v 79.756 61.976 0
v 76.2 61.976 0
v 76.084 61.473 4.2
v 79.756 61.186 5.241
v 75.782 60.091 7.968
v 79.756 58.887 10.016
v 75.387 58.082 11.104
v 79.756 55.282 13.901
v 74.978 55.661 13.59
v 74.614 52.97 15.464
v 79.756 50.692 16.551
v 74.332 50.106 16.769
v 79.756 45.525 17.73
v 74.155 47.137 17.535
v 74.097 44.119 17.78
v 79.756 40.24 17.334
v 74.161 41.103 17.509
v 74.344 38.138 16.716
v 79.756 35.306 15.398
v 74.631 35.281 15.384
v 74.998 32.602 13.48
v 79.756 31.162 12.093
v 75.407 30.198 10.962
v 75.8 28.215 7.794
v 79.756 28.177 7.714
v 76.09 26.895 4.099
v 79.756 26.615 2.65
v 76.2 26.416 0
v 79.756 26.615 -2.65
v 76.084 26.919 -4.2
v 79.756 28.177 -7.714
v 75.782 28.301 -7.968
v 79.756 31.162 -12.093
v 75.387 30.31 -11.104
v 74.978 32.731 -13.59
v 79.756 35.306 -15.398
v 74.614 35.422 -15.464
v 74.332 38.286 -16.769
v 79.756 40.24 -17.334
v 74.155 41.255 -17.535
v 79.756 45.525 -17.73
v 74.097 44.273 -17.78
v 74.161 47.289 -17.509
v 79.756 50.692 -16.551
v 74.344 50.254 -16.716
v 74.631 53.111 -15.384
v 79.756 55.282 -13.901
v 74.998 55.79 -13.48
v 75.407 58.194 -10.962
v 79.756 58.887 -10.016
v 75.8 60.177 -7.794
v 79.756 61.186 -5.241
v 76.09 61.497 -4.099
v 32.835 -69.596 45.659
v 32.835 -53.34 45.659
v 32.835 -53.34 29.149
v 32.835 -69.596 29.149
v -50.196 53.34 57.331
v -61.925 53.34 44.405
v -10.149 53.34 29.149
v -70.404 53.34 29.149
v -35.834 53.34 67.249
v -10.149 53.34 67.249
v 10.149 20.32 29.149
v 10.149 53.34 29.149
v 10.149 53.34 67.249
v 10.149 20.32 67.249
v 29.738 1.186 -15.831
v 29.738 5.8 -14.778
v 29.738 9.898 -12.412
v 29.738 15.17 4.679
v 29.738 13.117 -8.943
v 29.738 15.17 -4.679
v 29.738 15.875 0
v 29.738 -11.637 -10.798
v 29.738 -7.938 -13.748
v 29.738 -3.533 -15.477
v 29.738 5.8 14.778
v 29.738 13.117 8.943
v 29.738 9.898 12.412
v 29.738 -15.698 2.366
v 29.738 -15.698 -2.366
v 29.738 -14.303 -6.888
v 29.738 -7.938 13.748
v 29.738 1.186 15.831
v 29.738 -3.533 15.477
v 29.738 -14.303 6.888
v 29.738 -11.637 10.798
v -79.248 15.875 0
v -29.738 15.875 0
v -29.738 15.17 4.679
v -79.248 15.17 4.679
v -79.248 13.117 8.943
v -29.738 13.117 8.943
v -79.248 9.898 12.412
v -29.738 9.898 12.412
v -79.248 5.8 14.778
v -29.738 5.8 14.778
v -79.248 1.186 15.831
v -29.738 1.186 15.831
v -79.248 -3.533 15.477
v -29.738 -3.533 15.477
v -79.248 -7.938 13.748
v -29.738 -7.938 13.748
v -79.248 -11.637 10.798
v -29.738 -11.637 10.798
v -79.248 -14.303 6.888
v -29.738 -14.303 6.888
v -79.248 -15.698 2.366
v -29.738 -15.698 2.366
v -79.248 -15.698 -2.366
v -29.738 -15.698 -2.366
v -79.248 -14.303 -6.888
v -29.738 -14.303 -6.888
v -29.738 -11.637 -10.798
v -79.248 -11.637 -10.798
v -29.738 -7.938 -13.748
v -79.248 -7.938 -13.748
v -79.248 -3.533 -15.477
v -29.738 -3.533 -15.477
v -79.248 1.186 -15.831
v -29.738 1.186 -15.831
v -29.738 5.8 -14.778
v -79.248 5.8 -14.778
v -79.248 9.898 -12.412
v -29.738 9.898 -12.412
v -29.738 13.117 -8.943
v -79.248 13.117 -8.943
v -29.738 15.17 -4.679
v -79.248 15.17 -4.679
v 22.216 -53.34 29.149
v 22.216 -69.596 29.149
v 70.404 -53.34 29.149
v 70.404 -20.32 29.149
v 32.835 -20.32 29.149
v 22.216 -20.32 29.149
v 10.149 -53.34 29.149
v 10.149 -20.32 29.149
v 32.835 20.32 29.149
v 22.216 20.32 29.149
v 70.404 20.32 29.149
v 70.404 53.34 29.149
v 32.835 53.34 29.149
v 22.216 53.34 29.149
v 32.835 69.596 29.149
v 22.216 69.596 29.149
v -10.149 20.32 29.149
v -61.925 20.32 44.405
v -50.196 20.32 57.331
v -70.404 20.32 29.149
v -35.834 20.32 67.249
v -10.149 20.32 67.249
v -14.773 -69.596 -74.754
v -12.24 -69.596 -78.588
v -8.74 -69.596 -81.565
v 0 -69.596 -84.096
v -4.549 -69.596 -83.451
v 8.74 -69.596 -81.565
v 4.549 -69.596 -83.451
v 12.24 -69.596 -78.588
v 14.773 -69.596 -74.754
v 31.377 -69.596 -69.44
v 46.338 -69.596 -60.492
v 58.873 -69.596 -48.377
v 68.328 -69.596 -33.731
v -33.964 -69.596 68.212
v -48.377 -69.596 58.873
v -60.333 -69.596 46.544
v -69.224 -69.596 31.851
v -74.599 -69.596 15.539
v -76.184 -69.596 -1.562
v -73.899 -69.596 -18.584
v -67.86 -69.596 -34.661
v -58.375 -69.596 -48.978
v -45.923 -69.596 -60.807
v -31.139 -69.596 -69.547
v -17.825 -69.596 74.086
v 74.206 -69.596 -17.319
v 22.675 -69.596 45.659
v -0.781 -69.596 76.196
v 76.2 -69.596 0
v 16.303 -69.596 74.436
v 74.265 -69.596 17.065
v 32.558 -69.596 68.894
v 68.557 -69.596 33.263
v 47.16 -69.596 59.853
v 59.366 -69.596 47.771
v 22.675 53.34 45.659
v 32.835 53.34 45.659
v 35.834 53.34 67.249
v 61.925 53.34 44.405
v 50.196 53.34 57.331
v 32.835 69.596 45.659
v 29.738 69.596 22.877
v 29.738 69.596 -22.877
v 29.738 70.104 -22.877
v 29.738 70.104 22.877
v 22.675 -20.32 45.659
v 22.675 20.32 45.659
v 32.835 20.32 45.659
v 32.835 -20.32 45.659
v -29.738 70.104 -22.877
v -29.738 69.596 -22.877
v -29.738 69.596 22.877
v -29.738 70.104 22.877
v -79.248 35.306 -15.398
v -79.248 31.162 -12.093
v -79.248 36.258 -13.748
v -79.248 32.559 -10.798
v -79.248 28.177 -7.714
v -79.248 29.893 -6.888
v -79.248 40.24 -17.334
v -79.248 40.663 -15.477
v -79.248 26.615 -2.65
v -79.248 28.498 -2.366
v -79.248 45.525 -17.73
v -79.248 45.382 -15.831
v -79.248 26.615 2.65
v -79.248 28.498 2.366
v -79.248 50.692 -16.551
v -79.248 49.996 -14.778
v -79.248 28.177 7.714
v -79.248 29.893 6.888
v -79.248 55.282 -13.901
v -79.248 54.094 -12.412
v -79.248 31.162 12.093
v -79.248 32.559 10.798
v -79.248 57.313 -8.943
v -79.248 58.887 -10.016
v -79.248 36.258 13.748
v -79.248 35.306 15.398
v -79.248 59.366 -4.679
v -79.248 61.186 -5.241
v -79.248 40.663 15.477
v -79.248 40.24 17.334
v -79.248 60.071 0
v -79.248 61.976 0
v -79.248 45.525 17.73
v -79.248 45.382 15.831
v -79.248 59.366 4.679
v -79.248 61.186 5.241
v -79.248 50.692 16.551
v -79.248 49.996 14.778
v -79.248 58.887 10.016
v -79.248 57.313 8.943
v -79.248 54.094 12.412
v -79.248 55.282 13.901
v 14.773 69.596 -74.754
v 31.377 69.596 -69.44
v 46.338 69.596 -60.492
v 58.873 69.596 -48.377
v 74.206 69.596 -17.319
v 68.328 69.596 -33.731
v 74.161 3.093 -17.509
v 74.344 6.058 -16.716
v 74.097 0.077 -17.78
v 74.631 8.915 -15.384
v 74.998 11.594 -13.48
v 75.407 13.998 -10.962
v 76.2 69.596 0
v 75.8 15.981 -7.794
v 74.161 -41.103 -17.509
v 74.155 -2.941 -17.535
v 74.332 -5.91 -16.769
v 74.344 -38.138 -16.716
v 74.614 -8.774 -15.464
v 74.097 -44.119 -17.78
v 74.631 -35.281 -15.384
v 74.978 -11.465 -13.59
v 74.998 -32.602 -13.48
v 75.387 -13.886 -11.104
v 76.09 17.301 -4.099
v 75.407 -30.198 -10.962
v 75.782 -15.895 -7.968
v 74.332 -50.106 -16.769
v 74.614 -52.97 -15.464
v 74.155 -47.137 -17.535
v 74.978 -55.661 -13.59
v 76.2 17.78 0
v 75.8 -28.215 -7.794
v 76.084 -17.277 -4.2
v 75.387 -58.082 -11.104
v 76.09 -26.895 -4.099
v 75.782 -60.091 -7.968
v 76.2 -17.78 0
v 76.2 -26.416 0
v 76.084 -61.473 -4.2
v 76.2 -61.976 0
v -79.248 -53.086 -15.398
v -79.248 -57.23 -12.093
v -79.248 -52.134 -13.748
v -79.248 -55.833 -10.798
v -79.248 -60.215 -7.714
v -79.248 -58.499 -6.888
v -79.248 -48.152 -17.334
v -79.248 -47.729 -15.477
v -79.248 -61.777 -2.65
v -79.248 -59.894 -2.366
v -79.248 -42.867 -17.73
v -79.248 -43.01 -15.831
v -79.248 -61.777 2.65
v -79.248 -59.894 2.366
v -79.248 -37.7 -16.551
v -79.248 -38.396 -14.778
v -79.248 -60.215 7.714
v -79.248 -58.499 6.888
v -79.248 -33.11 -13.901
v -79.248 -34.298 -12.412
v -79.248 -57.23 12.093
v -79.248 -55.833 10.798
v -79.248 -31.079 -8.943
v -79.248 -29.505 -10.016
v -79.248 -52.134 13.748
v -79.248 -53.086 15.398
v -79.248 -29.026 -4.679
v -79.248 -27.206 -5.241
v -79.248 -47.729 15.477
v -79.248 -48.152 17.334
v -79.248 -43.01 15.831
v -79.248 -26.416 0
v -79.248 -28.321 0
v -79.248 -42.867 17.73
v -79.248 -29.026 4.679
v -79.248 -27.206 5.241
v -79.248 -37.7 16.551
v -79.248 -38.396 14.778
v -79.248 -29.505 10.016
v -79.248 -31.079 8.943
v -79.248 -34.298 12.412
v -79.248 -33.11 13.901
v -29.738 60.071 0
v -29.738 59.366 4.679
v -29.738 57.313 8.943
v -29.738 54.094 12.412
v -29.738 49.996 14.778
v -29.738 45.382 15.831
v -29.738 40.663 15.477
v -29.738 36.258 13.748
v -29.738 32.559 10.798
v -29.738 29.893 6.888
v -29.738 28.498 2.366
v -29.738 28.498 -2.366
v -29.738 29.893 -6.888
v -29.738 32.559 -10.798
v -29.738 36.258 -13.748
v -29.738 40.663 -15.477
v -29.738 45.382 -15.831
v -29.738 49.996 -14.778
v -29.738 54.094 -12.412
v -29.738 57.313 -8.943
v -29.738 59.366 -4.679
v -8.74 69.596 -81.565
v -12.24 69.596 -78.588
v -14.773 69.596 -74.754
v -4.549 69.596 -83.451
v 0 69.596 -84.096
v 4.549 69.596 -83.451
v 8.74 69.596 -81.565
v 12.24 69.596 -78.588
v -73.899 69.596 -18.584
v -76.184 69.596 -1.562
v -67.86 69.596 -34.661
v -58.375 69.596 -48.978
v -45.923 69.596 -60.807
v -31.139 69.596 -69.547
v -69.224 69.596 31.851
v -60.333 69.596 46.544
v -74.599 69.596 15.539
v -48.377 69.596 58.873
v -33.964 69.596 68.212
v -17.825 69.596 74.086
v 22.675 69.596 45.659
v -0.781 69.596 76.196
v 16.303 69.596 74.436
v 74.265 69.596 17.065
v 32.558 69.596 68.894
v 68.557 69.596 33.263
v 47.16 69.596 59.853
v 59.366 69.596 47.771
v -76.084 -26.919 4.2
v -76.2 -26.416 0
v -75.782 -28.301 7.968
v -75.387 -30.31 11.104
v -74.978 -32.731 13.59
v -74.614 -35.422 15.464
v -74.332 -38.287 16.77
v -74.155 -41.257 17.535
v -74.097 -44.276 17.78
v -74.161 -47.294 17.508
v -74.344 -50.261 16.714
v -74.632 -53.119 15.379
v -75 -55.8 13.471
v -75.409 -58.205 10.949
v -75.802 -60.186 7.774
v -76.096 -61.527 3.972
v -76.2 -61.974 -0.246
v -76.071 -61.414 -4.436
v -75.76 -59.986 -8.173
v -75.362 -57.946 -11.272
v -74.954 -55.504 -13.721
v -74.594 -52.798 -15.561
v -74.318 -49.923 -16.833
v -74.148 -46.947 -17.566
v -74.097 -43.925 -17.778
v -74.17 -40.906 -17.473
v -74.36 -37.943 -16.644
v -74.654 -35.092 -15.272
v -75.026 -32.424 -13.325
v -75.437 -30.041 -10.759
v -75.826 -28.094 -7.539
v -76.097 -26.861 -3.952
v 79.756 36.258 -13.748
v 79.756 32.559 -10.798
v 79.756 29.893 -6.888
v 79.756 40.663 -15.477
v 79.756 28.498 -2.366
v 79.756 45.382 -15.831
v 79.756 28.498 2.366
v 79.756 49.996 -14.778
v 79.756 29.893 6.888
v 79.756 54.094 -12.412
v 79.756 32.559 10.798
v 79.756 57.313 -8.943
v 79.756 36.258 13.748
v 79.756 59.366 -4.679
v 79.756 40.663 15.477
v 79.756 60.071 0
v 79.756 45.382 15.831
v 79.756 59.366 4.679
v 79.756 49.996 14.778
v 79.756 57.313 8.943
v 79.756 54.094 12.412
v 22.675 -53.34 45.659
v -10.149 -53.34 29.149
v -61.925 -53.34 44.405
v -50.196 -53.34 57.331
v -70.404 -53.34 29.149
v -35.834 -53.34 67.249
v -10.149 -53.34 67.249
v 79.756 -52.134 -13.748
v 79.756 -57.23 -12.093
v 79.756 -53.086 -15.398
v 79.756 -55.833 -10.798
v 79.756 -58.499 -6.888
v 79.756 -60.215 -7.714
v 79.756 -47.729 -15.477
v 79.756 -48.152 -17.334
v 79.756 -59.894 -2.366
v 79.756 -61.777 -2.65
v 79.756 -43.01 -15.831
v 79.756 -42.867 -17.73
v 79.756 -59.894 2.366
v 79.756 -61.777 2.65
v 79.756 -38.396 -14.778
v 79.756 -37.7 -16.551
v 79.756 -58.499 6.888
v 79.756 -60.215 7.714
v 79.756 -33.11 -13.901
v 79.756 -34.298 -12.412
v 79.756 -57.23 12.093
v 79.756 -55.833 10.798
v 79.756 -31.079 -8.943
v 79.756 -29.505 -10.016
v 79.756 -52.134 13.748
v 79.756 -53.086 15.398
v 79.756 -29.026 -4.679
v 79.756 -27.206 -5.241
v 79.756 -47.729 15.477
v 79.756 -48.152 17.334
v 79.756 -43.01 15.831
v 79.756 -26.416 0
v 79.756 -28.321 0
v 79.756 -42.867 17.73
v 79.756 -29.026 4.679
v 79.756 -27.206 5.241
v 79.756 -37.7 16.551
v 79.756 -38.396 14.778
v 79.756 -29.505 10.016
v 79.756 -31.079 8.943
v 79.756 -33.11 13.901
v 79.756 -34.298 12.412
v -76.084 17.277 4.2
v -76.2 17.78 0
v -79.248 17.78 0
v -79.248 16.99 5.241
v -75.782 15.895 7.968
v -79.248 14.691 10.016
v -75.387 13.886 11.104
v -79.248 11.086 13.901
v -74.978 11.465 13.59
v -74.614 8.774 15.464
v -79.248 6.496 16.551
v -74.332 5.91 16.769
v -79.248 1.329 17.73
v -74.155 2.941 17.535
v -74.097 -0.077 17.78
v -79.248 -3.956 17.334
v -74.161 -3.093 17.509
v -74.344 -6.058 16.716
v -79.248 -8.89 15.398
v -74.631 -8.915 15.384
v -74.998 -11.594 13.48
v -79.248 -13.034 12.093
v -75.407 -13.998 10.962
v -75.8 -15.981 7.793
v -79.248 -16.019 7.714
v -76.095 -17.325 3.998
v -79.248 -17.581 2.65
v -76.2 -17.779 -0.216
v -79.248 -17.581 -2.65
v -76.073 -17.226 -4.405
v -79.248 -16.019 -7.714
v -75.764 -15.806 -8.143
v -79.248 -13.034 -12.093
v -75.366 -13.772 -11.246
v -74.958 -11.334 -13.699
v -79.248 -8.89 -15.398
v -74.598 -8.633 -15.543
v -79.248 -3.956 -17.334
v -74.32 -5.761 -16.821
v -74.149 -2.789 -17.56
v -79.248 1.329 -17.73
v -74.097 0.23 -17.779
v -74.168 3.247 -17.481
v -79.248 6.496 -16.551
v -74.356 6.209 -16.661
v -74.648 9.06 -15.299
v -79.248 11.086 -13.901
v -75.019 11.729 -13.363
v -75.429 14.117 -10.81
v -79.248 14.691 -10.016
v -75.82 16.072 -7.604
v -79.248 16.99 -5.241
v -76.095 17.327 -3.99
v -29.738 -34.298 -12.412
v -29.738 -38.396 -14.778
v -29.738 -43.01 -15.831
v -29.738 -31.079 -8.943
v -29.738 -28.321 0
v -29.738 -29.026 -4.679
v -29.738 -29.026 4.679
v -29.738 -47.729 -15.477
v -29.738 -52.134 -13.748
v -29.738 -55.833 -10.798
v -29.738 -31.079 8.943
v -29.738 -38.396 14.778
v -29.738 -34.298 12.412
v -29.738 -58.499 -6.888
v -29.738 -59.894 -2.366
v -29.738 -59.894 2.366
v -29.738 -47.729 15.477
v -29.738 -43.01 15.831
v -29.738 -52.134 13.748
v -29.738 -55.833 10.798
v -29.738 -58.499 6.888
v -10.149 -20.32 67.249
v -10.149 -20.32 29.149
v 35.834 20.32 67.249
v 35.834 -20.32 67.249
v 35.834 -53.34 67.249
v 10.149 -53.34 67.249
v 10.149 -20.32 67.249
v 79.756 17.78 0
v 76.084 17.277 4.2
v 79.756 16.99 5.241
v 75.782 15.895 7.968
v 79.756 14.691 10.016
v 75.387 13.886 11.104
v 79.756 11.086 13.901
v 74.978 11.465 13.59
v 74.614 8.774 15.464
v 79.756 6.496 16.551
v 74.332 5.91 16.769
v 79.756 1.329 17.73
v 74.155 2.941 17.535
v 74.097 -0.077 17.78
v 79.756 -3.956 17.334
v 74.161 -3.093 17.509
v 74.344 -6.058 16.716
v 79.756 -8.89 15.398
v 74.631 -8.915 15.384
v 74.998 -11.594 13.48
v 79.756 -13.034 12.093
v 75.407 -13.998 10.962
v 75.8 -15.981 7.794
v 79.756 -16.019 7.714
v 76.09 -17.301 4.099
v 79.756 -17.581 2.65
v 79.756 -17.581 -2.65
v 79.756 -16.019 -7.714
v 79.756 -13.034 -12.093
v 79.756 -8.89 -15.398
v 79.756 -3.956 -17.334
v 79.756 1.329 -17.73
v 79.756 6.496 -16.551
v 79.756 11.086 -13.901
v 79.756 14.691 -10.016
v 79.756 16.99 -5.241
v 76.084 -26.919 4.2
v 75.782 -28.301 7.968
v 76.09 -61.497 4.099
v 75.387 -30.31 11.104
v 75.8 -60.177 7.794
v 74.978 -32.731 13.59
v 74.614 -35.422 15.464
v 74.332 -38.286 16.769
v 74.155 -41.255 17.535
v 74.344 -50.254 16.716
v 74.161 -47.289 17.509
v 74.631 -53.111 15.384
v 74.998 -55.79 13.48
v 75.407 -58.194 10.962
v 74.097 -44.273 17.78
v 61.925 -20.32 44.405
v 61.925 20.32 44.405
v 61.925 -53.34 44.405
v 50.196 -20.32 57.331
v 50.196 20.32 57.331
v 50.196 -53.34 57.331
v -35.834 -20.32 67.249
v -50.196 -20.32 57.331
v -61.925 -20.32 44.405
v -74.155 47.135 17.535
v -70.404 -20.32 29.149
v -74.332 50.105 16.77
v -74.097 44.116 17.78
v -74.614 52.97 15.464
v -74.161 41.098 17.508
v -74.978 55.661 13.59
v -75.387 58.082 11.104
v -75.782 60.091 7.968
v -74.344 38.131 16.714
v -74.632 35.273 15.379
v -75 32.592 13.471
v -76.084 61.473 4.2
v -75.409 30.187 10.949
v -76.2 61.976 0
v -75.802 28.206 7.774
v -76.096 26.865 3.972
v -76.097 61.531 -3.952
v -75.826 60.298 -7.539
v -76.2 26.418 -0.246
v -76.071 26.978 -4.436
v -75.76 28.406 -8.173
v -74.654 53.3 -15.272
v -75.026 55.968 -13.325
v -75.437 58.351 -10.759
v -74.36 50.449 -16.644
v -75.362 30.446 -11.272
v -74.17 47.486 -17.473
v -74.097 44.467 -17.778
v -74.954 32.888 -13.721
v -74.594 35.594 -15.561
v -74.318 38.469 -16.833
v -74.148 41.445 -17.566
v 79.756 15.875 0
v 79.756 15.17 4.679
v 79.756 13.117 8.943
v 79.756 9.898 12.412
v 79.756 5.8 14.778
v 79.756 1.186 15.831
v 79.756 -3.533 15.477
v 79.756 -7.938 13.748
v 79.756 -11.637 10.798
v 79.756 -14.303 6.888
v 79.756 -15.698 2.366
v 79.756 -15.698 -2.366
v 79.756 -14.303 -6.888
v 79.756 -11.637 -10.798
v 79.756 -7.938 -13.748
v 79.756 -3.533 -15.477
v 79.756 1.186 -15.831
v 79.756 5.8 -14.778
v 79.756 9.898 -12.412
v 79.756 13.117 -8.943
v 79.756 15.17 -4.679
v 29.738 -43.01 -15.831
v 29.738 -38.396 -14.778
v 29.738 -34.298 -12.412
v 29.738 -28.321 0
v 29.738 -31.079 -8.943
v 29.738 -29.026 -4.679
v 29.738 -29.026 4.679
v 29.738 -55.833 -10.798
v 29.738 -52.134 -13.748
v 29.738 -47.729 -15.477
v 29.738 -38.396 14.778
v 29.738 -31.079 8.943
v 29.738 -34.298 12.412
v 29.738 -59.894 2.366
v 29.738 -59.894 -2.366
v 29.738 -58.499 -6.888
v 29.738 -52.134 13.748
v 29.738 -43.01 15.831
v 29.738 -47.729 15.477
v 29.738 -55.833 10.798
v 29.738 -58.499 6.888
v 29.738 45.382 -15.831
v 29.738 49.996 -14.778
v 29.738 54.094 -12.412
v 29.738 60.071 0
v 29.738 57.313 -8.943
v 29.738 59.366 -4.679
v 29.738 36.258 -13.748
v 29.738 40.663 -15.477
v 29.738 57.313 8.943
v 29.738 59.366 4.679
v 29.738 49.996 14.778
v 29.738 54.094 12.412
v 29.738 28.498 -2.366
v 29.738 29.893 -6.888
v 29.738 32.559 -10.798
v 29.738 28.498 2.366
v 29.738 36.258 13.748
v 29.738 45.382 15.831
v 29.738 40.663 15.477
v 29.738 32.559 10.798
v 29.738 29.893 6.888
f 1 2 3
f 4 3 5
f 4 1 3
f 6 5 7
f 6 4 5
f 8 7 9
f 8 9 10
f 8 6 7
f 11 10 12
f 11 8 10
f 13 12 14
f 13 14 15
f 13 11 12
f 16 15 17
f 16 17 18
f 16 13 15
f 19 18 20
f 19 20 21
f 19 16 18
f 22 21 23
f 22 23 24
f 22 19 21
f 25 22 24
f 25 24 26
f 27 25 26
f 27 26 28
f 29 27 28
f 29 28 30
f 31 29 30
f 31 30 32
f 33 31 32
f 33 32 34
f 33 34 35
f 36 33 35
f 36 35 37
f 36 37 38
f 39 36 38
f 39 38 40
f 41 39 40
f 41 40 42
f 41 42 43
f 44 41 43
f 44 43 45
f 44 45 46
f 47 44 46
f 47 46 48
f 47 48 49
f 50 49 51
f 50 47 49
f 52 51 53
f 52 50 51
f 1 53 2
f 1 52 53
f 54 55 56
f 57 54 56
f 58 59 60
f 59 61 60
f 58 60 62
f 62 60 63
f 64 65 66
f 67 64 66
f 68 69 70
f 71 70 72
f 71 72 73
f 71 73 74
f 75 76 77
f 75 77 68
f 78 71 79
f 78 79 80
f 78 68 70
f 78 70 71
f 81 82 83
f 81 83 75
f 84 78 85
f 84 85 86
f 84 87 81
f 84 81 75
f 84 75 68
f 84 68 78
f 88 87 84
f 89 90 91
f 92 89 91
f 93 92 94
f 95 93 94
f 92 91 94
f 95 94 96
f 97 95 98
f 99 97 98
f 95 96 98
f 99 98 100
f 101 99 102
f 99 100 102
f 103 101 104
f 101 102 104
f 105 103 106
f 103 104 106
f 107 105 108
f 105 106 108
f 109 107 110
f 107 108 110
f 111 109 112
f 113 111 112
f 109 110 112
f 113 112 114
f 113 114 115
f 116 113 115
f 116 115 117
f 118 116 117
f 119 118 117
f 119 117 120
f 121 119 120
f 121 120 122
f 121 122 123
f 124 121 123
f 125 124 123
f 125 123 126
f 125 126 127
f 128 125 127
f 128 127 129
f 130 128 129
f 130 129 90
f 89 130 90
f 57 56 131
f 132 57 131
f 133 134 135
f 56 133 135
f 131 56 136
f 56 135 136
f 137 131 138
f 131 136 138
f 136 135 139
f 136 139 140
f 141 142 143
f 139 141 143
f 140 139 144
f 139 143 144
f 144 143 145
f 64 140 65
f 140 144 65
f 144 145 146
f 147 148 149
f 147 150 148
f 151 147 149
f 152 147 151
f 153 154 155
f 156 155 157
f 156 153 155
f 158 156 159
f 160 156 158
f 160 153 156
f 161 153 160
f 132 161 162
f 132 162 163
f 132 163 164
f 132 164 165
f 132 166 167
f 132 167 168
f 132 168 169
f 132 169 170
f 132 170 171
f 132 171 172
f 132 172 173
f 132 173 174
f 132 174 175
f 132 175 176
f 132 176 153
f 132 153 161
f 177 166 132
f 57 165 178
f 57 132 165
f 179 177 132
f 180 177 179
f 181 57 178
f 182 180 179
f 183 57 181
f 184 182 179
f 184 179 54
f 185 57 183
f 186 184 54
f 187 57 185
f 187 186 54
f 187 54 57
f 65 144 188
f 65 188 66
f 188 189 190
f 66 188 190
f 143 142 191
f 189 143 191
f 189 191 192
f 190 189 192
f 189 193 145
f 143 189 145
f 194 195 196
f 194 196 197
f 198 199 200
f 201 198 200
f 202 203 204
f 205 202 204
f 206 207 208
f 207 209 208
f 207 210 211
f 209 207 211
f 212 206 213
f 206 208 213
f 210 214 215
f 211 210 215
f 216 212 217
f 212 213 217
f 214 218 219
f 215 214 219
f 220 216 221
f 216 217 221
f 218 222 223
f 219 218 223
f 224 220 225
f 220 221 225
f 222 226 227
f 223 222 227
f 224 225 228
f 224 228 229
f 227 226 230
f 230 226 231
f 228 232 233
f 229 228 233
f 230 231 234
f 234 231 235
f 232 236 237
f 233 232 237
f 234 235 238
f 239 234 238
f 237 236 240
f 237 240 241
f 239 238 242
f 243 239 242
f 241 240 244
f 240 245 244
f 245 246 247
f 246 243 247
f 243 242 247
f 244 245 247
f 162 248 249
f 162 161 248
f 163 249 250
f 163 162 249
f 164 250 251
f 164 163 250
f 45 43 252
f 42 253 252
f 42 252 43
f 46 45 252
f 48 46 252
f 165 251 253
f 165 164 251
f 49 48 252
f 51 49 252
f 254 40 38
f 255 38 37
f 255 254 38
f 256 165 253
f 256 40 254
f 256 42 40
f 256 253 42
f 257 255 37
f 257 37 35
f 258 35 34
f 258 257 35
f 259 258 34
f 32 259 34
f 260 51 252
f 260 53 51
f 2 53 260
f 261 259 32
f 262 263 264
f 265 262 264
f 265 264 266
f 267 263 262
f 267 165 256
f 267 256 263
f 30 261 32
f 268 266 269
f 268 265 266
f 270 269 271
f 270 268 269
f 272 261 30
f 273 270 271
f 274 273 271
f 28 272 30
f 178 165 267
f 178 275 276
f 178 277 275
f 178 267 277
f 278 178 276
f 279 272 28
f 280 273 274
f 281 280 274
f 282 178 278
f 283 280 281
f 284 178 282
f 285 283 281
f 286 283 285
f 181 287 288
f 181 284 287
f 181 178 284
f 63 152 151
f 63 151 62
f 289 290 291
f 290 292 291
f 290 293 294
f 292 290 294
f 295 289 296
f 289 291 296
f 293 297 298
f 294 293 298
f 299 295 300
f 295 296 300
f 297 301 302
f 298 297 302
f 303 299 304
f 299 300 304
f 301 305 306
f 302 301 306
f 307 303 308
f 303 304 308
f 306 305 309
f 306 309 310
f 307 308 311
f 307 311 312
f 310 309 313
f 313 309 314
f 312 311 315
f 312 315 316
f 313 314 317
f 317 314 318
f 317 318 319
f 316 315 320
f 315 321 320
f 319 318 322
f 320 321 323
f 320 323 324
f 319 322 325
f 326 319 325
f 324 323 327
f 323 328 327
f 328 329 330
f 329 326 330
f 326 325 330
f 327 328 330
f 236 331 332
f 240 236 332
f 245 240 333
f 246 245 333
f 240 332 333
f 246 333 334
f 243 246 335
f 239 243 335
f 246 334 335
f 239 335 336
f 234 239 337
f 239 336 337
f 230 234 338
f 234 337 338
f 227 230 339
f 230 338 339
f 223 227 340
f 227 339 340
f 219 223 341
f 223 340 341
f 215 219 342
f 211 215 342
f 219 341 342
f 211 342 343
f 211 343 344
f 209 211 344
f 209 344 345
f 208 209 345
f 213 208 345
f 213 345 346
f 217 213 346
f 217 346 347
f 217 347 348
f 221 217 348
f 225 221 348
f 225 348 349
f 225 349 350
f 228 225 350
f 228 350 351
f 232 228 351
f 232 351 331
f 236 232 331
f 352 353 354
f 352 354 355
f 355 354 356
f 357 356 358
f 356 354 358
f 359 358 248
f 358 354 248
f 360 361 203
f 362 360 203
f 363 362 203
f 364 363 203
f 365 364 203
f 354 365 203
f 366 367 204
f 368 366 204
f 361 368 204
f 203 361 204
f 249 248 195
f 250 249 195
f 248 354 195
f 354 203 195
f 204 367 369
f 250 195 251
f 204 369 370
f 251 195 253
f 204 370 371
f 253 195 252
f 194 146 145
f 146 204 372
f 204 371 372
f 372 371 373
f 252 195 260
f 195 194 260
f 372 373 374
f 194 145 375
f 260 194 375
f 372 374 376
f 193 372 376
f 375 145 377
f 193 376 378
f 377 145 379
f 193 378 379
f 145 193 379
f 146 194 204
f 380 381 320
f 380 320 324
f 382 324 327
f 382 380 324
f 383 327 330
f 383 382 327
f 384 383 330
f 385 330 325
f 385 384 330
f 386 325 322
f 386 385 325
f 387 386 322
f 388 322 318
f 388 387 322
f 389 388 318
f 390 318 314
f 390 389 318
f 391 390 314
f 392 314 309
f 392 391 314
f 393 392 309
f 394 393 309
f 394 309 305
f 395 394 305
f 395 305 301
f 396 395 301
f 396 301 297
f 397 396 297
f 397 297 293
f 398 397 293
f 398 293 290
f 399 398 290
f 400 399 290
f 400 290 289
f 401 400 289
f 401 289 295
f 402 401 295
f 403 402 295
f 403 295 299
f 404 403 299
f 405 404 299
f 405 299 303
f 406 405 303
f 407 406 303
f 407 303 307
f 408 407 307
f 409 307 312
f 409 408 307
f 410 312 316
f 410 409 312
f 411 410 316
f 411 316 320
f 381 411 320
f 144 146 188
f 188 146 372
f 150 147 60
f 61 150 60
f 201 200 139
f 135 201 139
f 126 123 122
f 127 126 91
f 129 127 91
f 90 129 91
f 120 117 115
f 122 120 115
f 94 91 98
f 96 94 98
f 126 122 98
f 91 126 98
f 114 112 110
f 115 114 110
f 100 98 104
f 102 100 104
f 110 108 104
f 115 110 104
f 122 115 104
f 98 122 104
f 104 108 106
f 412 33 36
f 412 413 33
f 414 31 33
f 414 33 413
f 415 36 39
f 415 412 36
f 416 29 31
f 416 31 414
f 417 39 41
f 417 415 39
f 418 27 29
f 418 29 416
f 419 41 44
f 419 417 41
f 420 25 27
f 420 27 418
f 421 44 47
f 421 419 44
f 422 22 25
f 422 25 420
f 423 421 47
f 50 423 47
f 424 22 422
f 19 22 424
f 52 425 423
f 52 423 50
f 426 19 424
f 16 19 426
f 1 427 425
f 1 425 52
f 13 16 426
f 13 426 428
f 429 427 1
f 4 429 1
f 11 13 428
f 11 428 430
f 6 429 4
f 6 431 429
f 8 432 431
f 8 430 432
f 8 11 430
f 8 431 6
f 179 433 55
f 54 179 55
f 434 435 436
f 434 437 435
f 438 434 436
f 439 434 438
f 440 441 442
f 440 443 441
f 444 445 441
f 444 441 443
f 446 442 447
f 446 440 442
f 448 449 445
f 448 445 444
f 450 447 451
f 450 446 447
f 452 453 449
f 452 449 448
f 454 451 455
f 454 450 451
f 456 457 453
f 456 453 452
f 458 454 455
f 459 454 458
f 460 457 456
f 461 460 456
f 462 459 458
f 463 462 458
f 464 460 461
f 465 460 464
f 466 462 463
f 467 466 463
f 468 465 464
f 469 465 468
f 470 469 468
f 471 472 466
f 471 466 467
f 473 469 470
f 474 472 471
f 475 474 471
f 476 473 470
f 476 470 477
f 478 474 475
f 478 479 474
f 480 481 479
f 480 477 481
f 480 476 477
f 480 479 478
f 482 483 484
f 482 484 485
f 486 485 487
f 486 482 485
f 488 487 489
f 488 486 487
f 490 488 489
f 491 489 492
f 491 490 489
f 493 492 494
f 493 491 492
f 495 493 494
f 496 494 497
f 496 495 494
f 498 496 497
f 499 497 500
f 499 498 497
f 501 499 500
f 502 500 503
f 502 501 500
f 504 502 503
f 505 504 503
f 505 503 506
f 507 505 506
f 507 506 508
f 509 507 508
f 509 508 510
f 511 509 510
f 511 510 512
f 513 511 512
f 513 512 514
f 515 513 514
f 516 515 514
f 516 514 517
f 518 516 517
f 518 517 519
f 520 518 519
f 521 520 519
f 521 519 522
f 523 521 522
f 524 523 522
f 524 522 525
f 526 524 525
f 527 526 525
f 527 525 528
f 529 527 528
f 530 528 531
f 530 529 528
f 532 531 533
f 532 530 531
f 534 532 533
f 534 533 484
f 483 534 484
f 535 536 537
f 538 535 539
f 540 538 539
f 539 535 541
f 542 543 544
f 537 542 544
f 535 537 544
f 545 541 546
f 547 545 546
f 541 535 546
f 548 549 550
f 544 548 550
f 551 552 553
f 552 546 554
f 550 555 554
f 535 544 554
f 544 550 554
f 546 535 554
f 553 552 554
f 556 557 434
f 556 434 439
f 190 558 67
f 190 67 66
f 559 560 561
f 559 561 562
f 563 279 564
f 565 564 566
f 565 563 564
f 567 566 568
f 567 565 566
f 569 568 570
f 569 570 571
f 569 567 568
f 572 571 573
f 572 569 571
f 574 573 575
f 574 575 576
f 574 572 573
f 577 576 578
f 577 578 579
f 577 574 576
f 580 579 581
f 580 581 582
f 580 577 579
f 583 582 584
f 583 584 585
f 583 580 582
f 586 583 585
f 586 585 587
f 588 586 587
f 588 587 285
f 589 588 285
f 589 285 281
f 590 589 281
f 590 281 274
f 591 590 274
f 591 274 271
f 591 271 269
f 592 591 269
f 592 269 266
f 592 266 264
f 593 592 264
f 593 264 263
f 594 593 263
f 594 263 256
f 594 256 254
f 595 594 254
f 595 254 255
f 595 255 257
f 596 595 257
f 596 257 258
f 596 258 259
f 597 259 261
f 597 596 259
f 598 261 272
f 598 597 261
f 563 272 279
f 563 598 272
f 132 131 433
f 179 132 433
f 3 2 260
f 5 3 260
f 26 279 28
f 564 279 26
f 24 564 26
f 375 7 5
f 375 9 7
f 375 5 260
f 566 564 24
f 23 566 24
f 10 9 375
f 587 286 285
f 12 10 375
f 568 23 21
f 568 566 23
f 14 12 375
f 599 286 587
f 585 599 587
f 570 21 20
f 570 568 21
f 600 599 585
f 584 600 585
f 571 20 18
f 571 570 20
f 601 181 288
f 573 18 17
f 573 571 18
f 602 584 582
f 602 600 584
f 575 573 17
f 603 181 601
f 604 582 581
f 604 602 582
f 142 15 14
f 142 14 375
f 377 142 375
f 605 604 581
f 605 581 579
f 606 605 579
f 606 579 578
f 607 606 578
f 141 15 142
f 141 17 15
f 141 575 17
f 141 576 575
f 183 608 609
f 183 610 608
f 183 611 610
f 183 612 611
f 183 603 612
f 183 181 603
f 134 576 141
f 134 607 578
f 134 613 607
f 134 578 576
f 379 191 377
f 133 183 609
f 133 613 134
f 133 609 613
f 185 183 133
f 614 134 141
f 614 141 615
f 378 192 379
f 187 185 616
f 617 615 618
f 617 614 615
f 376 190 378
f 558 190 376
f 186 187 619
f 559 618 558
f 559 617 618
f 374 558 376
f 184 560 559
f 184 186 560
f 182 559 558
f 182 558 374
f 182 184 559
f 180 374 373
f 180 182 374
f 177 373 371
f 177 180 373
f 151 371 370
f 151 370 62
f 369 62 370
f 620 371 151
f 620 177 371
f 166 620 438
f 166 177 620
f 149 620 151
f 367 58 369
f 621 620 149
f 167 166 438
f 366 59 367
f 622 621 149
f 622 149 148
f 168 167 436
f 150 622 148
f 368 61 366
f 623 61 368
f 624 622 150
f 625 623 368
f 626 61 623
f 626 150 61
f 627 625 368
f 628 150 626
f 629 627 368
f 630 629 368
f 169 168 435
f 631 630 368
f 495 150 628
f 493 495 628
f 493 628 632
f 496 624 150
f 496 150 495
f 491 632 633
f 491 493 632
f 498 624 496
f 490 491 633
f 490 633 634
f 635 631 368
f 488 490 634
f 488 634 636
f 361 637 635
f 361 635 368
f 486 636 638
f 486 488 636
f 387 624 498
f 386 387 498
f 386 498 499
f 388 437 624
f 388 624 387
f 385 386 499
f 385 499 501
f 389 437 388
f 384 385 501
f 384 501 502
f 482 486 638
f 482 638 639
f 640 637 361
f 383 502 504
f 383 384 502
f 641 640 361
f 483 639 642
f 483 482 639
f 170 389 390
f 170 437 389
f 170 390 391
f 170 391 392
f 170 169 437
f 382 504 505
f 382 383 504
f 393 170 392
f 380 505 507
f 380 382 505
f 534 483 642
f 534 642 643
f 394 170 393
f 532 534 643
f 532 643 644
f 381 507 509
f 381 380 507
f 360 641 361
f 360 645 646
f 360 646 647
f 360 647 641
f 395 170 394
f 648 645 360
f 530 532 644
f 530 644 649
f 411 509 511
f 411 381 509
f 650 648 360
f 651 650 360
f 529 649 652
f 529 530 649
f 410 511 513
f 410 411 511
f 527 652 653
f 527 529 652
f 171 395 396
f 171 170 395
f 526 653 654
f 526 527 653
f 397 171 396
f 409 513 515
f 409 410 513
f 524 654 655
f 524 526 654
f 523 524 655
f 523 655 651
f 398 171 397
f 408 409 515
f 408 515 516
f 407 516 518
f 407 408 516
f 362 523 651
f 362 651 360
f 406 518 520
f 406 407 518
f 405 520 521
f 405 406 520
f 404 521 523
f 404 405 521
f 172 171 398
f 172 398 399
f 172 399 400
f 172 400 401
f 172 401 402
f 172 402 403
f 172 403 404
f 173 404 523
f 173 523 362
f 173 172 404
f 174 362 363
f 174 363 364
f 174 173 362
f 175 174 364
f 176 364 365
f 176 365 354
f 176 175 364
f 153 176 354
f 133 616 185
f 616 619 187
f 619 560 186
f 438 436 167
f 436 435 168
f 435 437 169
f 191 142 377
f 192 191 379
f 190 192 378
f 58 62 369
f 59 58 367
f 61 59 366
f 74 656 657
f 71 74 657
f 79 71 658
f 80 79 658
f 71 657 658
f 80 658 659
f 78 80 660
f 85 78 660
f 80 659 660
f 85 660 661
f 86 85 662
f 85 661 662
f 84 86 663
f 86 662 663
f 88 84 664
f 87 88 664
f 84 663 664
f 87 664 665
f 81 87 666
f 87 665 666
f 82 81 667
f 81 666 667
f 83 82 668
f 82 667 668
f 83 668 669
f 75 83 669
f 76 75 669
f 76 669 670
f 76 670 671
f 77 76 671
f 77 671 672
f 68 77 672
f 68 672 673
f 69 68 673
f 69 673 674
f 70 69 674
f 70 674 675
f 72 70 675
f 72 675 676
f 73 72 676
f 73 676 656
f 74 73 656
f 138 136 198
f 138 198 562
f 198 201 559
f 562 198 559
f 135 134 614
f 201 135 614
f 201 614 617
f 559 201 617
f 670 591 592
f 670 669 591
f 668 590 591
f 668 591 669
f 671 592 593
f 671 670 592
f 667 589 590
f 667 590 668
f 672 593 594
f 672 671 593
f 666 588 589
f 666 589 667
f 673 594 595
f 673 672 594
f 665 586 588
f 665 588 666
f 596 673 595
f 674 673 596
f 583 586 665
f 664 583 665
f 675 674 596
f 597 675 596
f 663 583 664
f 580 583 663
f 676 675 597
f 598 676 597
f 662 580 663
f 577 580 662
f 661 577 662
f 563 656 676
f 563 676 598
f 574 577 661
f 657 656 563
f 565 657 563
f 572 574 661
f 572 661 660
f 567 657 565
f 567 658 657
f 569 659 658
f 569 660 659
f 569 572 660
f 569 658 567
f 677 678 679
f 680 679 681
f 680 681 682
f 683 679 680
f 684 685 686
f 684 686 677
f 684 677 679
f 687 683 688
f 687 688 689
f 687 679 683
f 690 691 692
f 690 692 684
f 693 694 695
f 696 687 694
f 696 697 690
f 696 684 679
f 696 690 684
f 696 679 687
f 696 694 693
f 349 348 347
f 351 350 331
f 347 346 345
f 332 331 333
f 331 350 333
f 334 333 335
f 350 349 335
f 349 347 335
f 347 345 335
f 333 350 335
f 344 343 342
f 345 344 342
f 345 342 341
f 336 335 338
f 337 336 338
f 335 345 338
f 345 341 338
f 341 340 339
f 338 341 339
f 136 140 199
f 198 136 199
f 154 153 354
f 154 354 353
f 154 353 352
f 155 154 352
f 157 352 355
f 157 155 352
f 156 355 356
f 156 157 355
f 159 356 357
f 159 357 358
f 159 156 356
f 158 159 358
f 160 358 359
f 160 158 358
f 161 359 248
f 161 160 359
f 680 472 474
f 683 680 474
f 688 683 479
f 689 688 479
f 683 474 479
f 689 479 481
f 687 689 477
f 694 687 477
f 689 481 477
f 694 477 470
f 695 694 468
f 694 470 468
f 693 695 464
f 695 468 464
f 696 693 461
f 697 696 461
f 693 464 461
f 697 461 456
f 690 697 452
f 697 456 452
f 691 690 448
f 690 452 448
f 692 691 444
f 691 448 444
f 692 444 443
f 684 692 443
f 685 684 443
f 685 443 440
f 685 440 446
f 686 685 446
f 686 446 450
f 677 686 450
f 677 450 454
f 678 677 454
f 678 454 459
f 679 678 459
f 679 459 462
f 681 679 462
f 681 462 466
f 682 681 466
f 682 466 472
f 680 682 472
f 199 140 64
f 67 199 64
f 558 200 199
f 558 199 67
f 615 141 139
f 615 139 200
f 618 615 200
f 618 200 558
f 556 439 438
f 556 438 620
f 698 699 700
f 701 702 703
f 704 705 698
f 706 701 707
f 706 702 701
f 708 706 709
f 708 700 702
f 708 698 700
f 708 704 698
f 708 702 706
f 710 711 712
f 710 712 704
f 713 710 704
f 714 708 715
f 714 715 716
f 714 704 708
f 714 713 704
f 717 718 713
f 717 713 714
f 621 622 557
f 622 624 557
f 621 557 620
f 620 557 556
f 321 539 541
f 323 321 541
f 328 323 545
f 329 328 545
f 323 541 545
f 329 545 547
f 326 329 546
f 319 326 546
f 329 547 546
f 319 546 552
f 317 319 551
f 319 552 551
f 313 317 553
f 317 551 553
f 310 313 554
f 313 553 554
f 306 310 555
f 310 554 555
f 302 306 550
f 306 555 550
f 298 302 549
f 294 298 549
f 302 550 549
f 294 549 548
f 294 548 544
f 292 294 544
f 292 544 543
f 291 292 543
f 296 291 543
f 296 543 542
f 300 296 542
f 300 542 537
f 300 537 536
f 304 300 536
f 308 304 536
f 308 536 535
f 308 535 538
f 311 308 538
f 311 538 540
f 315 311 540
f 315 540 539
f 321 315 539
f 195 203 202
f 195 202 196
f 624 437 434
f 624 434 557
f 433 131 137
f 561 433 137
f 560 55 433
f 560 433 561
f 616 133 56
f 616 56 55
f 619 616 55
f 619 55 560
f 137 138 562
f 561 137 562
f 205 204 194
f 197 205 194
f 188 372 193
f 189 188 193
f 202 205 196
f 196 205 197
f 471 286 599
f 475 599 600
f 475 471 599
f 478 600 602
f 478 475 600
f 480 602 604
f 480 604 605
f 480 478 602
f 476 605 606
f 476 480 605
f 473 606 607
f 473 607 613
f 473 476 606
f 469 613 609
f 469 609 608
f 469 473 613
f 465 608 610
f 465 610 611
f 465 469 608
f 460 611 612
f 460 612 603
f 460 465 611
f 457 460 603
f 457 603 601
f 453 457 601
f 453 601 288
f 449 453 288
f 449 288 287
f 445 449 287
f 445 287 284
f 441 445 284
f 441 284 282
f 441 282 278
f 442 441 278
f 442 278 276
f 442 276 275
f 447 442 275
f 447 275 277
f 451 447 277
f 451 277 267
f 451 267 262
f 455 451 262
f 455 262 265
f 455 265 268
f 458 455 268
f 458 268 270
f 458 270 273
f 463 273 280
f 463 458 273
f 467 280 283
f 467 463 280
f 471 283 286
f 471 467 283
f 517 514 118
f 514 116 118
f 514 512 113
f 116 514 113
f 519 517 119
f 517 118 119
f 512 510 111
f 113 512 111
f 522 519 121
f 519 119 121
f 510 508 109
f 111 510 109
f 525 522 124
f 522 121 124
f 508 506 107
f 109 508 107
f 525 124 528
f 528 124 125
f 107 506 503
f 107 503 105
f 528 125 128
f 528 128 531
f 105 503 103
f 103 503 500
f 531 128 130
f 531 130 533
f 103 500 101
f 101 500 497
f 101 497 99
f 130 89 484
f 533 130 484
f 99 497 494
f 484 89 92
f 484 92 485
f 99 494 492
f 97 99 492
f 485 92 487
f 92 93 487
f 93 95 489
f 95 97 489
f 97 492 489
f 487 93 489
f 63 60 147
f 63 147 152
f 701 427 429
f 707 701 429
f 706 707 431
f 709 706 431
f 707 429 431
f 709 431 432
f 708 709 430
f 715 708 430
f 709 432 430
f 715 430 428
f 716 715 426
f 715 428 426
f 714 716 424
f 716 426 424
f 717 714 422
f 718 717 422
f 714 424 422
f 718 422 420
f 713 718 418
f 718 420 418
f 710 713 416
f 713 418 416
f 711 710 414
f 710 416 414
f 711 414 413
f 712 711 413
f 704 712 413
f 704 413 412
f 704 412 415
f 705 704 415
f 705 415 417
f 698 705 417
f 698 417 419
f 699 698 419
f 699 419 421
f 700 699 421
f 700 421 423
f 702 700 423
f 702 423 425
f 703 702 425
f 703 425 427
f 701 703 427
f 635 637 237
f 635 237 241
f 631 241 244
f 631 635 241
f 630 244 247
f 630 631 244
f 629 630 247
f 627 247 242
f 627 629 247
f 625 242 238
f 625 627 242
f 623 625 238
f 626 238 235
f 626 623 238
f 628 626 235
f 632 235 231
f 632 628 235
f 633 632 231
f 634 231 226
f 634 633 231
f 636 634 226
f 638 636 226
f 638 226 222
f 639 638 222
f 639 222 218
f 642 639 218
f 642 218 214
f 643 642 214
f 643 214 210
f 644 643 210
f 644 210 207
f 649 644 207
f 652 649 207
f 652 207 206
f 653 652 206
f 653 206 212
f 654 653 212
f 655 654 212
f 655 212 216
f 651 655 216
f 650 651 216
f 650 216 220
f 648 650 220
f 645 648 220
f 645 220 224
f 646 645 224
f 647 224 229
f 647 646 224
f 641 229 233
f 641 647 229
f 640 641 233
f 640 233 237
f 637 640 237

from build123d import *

# Parameters (mm, degrees)
F0_R      = 76.2
F1_DEPTH  = 69.596
F3_R      = 17.78
F4_DEPTH  = 159.004
F5_R      = 15.875
F6_DEPTH  = 258.064
F7_W      = 59.475604
F7_H      = 45.754954
F8_DEPTH  = 139.7
F9_W      = 33.02
F9_H      = 38.1
F10_DEPTH = 170.434
F11_W     = 20.298936
F11_H     = 62.223652
F12_DEPTH = 135.128
F13_R     = 16.35239
F14_DEPTH = 69.596
F16_DEPTH = 136.652


with BuildPart() as f1:
    # F0 (on Front) → F1 (new body, symmetric)
    with BuildSketch(Plane.XZ):
        Circle(F0_R)
    extrude(amount=F1_DEPTH, both=True)

    # F3 (on offset) → F4 (join)
    with BuildSketch(Plane.YZ.offset(79.756)):
        with Locations((-44.196, 0)):
            Circle(F3_R)
        Circle(F3_R)
        with Locations((44.196, 0)):
            Circle(F3_R)
    extrude(amount=-F4_DEPTH)

    # F5 (on offset) → F6 (cut)
    with BuildSketch(Plane.YZ.offset(79.756)):
        with Locations((-44.196, 0)):
            Circle(F5_R)
        Circle(F5_R)
        with Locations((44.196, 0)):
            Circle(F5_R)
    extrude(amount=-F6_DEPTH, mode=Mode.SUBTRACT)

    # F7 (on face) → F8 (join)
    with BuildSketch(Plane.XZ.offset(69.596)):
        Rectangle(F7_W, F7_H)
    extrude(amount=-F8_DEPTH)

    # F9 (on offset) → F10 (cut)
    with BuildSketch(Plane.YZ.offset(79.756)):
        with Locations((-36.83, 48.198743)):
            Rectangle(F9_W, F9_H)
        with Locations((36.83, 48.198743)):
            Rectangle(F9_W, F9_H)
    extrude(amount=-F10_DEPTH, mode=Mode.SUBTRACT)

    # F11 (on face) → F12 (join)
    with BuildSketch(Plane(origin=(0, 69.596, 0), x_dir=(-1, 0, 0), z_dir=(0, 1, 0))):
        with Locations((0, 44.409219)):
            Rectangle(F11_W, F11_H)
    extrude(amount=-F12_DEPTH)

    # F13 (on Front) → F14 (join, symmetric)
    with BuildSketch(Plane.XZ):
        with Locations((0, -67.743778)):
            Circle(F13_R)
    extrude(amount=F14_DEPTH, both=True)

    # F15 (on face) → F16 (cut, symmetric)
    with BuildSketch(Plane(origin=(0, -53.34, 0), x_dir=(-1, 0, 0), z_dir=(0, 1, 0))):
        Polygon((-32.835285, 45.658743), (-32.835285, 29.148743), (-22.216139, 29.148743), (-22.675285, 45.658743), align=None)
    extrude(amount=F16_DEPTH, both=True, mode=Mode.SUBTRACT)


solid = f1.part
